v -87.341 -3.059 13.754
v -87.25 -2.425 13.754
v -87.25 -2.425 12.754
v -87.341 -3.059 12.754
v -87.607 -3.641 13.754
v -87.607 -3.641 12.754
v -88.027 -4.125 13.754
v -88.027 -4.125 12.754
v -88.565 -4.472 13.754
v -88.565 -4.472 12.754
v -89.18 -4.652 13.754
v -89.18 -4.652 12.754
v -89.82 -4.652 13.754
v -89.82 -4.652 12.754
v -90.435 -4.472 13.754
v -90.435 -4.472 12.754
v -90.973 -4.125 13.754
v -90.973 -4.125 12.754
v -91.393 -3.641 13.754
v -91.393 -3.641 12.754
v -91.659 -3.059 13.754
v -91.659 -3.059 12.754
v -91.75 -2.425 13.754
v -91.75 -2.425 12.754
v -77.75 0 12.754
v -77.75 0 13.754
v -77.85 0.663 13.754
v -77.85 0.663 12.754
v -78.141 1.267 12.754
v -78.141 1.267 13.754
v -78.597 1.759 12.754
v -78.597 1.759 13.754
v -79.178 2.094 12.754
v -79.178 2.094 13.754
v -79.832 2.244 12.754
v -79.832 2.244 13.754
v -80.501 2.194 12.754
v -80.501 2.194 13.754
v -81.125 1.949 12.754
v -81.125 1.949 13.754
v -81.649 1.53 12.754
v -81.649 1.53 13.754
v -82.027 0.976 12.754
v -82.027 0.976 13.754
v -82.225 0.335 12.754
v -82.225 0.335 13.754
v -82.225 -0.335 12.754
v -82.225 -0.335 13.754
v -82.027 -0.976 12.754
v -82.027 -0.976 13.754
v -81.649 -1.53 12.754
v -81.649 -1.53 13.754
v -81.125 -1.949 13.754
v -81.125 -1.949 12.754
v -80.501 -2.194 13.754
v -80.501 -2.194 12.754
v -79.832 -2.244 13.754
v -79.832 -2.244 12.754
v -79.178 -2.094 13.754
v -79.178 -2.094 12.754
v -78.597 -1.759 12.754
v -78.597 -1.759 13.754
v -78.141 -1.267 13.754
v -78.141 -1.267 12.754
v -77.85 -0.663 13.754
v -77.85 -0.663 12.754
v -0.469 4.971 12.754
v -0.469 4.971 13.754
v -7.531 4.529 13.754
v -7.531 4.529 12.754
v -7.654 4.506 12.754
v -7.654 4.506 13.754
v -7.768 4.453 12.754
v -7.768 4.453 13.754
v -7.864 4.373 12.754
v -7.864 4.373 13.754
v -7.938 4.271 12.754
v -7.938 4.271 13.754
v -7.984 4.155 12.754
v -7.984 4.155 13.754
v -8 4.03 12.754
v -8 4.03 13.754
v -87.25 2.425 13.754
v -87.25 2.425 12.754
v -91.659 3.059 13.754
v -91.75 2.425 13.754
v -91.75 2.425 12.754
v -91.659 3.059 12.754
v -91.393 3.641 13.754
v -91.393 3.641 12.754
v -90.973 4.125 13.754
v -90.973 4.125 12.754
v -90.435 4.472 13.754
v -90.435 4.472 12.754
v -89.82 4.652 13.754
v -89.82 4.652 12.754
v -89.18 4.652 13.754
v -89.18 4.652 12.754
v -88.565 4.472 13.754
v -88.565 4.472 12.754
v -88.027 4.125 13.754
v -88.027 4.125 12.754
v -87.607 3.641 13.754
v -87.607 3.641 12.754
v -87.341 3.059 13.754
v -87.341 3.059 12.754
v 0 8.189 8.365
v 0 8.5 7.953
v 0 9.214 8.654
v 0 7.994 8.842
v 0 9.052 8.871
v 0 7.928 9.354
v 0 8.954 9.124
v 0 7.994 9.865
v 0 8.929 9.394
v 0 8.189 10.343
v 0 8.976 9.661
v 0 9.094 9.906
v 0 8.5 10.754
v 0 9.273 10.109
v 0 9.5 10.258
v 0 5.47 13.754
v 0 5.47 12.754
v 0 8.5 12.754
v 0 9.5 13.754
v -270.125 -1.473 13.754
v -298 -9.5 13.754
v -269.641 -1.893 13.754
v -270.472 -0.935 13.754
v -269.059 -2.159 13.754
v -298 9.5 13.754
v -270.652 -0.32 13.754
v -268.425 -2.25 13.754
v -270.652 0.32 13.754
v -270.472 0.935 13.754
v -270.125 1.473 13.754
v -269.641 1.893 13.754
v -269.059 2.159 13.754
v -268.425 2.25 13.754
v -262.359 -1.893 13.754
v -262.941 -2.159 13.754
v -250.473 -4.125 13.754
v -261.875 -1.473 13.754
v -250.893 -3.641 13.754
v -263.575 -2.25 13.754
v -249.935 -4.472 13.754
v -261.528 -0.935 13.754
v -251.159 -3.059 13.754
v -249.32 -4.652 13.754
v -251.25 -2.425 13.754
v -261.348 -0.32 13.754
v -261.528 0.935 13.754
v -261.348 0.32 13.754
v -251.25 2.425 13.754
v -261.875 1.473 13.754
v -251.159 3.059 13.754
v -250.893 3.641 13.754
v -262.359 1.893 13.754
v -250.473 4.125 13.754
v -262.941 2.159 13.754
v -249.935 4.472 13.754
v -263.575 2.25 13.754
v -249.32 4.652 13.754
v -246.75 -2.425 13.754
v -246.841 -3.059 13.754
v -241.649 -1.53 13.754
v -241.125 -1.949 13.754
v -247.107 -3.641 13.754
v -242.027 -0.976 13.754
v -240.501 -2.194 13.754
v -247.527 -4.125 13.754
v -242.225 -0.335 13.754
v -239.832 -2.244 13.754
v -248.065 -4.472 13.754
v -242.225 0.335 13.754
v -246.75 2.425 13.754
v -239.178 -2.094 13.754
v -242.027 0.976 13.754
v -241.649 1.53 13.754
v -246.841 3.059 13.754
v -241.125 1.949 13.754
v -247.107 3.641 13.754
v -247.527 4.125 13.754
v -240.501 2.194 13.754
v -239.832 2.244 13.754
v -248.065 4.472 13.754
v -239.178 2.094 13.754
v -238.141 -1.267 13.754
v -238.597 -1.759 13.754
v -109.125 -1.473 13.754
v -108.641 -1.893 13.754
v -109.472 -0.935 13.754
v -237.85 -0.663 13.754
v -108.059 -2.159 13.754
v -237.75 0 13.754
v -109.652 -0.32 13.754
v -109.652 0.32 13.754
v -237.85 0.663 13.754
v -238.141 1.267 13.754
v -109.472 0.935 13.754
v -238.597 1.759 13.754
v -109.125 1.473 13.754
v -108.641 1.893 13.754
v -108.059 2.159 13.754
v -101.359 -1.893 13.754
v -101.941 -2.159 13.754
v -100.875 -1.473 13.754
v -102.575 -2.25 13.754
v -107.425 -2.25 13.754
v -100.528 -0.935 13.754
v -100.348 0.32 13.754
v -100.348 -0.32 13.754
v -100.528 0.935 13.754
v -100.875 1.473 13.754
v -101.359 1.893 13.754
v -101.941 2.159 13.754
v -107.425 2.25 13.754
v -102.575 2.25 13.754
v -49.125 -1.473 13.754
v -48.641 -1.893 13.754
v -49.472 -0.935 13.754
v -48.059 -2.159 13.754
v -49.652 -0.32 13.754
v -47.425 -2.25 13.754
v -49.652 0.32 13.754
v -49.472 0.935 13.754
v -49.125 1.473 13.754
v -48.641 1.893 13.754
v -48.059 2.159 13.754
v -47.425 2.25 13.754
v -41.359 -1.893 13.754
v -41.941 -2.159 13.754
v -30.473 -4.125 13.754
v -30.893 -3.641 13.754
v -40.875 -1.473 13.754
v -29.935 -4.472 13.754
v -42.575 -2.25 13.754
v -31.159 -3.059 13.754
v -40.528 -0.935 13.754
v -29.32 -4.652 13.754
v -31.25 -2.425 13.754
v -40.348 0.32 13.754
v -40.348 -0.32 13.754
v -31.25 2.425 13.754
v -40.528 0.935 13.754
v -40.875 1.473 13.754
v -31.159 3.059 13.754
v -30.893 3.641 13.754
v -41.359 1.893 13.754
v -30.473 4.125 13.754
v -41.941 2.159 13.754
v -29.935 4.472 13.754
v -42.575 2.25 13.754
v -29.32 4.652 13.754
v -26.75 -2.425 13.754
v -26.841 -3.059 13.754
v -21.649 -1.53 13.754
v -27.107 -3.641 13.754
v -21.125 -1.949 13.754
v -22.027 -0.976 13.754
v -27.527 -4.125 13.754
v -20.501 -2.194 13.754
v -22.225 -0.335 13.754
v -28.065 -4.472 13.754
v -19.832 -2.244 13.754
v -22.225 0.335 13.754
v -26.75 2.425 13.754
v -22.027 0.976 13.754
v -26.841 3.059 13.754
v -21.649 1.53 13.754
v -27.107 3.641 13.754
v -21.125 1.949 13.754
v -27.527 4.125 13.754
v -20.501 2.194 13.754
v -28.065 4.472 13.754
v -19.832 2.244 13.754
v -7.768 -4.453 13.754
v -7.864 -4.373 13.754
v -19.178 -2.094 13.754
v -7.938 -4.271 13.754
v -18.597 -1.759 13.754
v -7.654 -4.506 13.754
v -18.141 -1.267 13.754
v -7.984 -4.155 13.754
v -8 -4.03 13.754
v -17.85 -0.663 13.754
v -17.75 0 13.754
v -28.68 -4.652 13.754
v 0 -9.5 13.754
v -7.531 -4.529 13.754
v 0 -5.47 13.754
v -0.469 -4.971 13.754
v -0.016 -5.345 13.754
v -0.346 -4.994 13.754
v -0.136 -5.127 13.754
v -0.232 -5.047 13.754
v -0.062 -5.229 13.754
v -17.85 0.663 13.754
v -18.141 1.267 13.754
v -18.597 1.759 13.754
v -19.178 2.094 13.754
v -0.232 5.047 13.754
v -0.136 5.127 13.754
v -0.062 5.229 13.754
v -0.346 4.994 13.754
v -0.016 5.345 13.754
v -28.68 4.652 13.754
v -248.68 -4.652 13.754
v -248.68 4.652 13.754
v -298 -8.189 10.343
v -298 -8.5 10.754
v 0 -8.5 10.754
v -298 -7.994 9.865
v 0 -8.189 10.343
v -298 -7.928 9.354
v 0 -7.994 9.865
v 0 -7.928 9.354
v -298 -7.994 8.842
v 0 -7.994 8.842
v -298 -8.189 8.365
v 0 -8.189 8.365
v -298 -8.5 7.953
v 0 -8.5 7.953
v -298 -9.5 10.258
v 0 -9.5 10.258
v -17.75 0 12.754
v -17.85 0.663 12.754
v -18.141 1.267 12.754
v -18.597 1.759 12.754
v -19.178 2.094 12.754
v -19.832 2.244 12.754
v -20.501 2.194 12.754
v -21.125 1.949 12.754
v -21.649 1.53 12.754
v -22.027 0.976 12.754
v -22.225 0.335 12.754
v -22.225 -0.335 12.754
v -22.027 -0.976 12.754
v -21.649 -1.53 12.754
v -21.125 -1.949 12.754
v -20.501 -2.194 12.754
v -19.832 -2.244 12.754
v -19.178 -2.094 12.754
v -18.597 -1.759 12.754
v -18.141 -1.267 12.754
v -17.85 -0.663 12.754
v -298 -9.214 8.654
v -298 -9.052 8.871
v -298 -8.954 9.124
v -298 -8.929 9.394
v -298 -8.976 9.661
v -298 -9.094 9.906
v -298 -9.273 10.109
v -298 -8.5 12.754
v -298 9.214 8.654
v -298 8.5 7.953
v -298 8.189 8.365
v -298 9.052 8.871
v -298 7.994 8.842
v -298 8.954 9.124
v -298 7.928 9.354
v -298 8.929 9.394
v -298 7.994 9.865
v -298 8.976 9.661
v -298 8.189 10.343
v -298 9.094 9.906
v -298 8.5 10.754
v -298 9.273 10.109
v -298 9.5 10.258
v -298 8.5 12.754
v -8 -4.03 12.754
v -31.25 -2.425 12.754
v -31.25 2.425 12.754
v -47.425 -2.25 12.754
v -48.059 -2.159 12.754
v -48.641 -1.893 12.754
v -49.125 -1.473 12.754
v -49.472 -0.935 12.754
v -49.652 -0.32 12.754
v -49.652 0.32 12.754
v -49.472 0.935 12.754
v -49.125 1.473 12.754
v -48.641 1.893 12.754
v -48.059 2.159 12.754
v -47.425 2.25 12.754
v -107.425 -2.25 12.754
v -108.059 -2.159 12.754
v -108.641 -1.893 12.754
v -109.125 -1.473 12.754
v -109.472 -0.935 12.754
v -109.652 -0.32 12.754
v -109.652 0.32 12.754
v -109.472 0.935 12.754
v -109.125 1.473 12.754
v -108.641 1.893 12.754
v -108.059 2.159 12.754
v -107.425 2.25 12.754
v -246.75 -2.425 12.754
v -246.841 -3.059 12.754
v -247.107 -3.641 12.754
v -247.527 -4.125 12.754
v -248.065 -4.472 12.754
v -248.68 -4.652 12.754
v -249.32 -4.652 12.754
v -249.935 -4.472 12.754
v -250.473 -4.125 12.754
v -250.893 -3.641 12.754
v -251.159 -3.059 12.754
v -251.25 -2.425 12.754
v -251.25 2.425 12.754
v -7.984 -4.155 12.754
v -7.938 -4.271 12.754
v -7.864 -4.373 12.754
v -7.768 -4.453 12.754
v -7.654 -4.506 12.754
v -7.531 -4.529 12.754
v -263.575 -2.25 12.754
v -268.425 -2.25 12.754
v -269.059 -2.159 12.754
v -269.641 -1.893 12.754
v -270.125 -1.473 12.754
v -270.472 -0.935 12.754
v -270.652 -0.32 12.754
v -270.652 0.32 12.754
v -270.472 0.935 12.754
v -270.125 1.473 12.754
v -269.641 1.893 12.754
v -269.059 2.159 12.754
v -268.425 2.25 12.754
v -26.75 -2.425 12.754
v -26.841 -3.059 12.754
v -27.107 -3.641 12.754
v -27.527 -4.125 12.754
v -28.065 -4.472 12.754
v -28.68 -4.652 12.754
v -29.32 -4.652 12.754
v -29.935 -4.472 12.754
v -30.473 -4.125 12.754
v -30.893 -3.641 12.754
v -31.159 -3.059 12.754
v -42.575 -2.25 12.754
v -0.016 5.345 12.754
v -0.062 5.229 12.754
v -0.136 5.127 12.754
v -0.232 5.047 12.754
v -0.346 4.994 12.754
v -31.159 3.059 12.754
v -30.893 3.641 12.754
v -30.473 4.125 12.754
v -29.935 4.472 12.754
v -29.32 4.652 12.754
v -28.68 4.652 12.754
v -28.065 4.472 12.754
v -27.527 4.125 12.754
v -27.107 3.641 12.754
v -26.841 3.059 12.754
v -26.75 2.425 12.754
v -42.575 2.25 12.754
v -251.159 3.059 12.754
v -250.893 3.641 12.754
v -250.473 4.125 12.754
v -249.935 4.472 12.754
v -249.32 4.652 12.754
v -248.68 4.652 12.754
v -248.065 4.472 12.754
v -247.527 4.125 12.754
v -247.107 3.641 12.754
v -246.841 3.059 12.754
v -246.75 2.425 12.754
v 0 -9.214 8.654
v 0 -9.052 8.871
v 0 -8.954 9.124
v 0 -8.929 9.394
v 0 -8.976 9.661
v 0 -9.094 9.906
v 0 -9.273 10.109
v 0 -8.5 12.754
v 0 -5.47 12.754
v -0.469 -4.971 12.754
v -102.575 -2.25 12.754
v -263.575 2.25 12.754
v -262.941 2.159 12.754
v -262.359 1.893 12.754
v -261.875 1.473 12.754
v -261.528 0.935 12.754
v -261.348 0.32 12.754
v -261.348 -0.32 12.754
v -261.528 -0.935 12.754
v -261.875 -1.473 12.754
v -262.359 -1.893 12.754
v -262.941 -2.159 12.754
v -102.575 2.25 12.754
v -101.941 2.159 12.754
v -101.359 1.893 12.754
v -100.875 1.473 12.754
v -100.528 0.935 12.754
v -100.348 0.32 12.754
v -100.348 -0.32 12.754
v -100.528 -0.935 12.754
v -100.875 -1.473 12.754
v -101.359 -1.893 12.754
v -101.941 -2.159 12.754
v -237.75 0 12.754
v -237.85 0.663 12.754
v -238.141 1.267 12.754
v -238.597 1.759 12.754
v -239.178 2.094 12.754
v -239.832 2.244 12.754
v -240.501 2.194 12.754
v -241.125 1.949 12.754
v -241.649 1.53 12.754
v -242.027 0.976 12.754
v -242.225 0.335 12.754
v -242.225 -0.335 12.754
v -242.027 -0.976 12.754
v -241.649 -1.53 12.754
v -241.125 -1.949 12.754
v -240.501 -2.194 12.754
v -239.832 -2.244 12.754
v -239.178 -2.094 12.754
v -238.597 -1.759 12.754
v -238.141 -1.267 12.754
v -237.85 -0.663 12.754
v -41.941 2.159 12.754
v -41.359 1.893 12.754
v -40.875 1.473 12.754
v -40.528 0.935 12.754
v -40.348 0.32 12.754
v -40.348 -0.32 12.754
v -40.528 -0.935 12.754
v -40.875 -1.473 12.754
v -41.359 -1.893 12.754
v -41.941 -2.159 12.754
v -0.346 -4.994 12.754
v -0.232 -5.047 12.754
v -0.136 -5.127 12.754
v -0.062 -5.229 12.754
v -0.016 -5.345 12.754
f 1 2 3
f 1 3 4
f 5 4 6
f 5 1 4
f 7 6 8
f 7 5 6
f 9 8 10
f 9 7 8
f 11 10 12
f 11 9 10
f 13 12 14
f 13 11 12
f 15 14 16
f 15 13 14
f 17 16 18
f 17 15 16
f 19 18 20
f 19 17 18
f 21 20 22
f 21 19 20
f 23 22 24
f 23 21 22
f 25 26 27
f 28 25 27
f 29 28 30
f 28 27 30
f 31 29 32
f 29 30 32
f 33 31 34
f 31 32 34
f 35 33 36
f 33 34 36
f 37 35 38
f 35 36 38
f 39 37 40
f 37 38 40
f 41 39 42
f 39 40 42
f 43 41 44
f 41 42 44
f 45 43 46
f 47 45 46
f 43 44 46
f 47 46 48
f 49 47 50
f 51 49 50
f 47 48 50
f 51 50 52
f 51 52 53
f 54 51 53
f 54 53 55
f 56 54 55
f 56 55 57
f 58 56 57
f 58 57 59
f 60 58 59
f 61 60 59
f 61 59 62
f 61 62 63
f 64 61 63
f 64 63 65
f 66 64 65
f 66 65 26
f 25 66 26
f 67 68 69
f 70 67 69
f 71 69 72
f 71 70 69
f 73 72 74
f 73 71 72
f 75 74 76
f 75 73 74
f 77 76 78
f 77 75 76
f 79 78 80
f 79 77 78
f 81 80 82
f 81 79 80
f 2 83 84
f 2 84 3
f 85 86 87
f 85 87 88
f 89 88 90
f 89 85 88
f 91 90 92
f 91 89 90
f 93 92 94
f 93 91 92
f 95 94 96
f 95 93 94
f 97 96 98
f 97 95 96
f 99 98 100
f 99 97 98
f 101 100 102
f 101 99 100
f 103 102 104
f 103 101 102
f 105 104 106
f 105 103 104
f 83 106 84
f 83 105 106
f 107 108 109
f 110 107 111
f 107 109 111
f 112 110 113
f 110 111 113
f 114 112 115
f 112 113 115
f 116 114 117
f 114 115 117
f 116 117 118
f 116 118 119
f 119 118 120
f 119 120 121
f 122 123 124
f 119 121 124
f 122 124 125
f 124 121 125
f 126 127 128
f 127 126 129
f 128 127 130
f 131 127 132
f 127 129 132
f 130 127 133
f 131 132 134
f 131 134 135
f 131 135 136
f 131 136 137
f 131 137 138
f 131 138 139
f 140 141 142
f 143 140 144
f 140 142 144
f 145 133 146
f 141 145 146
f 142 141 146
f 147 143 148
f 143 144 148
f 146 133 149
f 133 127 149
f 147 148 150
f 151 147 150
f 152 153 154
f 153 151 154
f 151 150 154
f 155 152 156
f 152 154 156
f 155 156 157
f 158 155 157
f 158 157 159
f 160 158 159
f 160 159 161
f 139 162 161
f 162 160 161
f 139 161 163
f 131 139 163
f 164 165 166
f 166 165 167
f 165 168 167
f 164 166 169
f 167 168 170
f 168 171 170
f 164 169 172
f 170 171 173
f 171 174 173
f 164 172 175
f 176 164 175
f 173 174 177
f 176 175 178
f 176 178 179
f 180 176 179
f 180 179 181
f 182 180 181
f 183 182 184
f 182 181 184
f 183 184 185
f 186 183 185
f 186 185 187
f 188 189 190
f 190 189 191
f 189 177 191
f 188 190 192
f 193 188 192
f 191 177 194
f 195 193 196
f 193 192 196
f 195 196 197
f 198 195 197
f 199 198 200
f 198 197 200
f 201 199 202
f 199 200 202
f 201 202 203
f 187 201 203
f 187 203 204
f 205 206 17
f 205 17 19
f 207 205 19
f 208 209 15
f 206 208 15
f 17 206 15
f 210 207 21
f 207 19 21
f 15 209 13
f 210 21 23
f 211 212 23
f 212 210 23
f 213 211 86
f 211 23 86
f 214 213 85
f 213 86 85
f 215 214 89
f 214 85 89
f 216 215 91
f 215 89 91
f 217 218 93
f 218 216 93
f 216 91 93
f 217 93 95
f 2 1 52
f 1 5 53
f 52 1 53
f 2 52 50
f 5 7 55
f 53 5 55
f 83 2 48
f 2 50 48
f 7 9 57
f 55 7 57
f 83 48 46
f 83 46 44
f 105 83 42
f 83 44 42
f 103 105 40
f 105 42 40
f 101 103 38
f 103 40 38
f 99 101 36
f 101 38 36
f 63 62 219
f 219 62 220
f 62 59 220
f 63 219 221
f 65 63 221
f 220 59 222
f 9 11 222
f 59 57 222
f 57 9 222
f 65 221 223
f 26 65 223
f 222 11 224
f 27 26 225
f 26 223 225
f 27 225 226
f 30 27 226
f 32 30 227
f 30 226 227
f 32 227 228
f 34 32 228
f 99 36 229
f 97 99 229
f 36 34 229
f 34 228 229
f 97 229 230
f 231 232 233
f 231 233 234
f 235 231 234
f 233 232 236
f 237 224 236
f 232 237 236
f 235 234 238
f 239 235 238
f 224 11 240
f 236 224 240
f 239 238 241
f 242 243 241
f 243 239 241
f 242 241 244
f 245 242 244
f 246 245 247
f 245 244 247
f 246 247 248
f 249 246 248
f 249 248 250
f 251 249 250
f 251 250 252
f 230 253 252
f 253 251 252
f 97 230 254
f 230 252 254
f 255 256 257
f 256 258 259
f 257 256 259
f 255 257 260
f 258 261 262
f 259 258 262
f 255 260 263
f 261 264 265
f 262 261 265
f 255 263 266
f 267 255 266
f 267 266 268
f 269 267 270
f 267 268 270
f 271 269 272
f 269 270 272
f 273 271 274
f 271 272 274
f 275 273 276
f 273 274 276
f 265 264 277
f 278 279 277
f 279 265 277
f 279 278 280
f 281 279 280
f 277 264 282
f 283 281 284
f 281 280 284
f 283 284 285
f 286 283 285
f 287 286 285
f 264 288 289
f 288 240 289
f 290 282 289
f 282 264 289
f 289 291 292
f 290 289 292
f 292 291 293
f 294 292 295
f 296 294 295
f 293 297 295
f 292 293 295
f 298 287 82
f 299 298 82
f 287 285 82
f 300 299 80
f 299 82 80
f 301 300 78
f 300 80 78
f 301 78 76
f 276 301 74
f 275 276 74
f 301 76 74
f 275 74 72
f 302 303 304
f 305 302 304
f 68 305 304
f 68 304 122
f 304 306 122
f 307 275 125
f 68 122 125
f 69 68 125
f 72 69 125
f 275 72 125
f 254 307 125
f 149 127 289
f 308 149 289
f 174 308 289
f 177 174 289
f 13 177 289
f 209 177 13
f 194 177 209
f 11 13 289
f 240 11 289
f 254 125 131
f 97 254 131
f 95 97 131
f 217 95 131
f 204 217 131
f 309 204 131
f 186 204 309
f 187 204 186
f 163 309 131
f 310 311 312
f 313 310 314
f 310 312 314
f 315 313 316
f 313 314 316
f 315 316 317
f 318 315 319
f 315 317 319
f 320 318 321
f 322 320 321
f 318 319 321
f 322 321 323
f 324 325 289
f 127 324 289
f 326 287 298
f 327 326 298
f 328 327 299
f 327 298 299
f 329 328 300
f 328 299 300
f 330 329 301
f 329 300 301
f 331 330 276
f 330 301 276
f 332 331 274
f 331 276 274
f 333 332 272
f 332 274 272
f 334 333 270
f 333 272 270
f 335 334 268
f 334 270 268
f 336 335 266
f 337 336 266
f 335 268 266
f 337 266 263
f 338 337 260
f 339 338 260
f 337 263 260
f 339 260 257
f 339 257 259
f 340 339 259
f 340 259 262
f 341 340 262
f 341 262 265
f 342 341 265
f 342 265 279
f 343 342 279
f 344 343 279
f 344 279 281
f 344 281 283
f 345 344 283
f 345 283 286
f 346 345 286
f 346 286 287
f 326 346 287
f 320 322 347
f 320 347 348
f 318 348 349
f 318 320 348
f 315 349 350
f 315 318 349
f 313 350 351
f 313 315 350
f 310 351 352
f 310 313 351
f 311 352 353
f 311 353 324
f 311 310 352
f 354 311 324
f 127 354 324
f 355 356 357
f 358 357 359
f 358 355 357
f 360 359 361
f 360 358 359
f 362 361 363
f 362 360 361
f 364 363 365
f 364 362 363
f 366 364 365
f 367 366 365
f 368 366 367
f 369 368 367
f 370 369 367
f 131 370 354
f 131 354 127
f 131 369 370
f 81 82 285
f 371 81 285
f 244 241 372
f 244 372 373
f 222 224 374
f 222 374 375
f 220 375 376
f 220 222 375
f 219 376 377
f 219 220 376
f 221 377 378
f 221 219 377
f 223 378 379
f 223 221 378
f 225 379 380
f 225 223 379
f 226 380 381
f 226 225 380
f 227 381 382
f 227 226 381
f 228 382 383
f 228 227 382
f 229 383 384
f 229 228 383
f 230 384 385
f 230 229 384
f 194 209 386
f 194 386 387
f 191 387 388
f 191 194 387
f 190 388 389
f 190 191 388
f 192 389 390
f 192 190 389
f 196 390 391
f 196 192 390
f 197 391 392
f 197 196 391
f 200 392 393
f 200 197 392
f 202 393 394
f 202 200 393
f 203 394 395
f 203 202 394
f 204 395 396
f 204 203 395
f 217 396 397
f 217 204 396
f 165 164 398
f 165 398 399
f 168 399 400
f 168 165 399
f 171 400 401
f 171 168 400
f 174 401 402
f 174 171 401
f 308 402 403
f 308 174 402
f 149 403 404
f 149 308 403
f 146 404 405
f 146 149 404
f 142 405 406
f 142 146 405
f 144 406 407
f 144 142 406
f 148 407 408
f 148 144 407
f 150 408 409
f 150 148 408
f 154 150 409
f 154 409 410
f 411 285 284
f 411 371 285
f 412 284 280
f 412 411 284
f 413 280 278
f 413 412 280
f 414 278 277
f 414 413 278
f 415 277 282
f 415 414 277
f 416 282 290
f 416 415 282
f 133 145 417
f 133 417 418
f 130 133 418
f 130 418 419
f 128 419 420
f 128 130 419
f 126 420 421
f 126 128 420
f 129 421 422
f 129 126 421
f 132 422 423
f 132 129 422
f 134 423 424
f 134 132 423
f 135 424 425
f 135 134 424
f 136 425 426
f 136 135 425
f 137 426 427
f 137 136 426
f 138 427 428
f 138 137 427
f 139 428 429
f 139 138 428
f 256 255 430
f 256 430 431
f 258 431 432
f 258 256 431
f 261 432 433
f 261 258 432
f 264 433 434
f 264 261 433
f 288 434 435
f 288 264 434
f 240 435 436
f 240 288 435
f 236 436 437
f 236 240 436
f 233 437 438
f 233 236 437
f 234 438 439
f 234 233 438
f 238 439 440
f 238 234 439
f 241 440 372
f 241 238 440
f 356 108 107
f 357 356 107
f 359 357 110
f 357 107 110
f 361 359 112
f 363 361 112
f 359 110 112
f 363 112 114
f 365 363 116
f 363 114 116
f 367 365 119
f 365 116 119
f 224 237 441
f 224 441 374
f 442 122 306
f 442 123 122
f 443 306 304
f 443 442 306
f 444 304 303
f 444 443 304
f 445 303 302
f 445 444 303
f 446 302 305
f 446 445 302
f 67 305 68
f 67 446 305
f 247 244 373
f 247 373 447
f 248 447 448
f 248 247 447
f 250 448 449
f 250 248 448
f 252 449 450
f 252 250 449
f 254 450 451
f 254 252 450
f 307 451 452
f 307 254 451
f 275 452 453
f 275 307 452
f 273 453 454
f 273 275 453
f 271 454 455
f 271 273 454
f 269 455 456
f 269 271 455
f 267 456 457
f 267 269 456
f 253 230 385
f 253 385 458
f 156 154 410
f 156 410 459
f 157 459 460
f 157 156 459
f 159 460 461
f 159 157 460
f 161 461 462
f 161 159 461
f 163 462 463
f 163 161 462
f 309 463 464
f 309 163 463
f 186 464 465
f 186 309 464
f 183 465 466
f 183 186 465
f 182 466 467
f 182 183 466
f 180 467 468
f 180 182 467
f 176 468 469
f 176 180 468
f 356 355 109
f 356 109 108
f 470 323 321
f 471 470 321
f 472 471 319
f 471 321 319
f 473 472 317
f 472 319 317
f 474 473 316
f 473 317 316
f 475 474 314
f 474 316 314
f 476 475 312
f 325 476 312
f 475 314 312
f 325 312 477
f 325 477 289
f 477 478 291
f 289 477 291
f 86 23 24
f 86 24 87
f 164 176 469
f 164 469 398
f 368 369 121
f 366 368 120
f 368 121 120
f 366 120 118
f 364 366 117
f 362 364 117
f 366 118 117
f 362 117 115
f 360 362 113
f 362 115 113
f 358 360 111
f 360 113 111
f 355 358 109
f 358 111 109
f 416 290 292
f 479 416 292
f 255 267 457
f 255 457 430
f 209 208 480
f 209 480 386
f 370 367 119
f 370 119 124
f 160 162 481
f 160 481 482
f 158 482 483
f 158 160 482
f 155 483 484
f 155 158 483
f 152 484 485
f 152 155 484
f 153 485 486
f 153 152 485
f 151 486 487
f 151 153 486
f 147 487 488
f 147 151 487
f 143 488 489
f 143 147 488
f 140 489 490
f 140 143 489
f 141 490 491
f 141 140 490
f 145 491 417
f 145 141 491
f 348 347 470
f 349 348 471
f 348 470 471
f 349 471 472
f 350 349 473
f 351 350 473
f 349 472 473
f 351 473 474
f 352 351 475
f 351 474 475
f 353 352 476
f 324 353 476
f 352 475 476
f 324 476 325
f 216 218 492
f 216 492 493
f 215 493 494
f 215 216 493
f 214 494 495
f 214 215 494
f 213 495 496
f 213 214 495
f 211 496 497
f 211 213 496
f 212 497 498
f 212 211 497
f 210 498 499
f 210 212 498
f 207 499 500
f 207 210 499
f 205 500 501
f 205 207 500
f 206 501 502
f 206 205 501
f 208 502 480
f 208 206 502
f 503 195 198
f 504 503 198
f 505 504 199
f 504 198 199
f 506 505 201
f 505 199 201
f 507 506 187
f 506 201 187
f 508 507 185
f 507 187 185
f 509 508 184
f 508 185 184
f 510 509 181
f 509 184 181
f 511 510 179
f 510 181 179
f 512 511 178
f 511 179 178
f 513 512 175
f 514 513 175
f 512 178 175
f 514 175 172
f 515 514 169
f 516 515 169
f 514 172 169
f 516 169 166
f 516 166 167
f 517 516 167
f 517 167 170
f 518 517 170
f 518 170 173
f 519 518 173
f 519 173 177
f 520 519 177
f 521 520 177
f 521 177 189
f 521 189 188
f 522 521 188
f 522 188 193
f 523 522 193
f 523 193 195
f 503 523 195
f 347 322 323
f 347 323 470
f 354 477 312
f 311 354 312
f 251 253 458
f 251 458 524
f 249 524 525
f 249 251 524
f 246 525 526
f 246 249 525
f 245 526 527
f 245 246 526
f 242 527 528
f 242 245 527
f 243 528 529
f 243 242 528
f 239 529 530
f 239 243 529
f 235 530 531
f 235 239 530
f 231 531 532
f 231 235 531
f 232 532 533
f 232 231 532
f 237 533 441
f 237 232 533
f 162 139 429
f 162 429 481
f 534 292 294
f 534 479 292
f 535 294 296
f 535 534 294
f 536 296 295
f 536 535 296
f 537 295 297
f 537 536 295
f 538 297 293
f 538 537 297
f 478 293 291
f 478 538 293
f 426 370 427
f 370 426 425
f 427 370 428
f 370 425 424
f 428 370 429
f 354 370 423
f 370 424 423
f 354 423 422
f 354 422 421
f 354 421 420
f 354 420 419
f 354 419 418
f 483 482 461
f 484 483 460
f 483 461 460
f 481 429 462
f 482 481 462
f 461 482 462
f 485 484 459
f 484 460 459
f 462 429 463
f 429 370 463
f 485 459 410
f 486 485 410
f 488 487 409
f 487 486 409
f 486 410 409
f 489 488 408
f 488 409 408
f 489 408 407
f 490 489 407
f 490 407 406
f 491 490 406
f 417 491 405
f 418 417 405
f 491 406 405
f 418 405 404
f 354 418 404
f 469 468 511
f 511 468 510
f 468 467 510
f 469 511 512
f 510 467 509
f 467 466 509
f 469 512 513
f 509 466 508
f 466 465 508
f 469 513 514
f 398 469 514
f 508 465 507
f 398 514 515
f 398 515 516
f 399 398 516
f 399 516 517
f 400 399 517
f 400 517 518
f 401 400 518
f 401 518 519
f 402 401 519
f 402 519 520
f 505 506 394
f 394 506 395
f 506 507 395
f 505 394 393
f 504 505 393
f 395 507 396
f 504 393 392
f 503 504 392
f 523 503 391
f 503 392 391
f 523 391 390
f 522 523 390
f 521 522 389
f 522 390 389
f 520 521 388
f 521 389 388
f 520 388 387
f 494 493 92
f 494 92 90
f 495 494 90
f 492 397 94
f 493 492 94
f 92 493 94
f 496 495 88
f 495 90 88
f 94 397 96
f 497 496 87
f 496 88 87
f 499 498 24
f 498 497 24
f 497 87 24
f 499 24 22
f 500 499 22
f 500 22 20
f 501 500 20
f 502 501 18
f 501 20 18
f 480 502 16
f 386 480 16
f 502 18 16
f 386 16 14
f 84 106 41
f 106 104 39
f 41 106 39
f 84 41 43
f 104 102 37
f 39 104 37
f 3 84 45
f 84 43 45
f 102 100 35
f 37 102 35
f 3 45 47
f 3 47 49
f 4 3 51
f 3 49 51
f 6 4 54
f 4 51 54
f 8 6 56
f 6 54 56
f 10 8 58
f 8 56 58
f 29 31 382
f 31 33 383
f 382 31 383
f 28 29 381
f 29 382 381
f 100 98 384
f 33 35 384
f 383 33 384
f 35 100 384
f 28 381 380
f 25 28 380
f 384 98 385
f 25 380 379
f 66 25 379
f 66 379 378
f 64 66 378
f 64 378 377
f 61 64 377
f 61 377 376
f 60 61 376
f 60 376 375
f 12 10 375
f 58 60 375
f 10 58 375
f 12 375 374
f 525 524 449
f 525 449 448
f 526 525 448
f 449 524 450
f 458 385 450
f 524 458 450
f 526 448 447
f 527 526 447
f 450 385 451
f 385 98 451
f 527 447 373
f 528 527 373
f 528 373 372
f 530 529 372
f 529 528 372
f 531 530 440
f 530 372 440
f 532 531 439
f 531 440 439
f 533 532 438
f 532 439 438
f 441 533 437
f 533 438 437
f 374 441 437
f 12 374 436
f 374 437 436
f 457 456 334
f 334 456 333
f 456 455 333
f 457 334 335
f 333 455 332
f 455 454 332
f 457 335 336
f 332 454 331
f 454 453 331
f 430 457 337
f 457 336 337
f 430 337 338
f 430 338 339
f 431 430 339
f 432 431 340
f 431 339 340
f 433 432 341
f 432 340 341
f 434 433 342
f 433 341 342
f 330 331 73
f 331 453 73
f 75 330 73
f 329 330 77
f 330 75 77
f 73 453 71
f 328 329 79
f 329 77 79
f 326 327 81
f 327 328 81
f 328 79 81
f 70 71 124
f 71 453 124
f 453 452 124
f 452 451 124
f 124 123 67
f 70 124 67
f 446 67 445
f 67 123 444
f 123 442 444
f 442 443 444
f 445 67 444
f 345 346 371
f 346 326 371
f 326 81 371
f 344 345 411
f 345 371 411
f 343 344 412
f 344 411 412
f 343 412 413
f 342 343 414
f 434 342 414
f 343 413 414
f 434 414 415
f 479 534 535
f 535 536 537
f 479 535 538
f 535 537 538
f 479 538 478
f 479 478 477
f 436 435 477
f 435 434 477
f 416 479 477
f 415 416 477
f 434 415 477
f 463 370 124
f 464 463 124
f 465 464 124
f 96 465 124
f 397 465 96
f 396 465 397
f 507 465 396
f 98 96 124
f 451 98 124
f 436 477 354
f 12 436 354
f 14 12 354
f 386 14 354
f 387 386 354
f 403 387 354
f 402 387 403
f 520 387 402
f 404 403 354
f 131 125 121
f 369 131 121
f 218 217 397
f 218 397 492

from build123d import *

# Parameters (mm, degrees)
EXTRUDE_THIN1_DEPTH   = 298
ESBO_O1_R             = 2.25
CORTE_EXTRUS_O1_DEPTH = 299.207817733
FILETE1_R             = 0.5


with BuildPart() as part:
    # Sketch1 → Extrude-Thin1 (new body)
    with BuildSketch(Plane(origin=(0, 0, 0), x_dir=(0, 0, -1), z_dir=(1, 0, 0))):
        with BuildLine():
            ThreePointArc((-7.953264718, 8.5), (-9.353805922, 7.927754998), (-10.754347127, 8.5))
            Line((-10.754347127, 8.5), (-12.754347127, 8.5))
            Line((-12.754347127, 8.5), (-12.754347127, -8.5))
            Line((-12.754347127, -8.5), (-10.754347127, -8.5))
            ThreePointArc((-10.754347127, -8.5), (-9.353805922, -7.927754998), (-7.953264718, -8.5))
            Line((-7.953264718, -8.5), (-8.65353532, -9.213877499))
            ThreePointArc((-8.65353532, -9.213877499), (-9.529396971, -8.943291803), (-10.25770064, -9.5))
            Line((-10.25770064, -9.5), (-13.754347127, -9.5))
            Line((-13.754347127, -9.5), (-13.754347127, 9.5))
            Line((-13.754347127, 9.5), (-10.25770064, 9.5))
            ThreePointArc((-10.25770064, 9.5), (-9.529396971, 8.943291803), (-8.65353532, 9.213877499))
            Line((-8.65353532, 9.213877499), (-7.953264718, 8.5))
        make_face()
    extrude(amount=-EXTRUDE_THIN1_DEPTH)

    # Esboço1 → Corte-extrusão1 (cut, through all)
    with BuildSketch(Plane.XY.offset(13.754347127)):
        with Locations((-240, 0)):
            Circle(ESBO_O1_R)
        with Locations((-20, 0)):
            Circle(ESBO_O1_R)
        with Locations((-80, 0)):
            Circle(ESBO_O1_R)
        with BuildLine():
            Line((-268.425, 2.25), (-263.575, 2.25))
            ThreePointArc((-263.575, 2.25), (-261.325, 0), (-263.575, -2.25))
            Line((-263.575, -2.25), (-268.425, -2.25))
            ThreePointArc((-268.425, -2.25), (-270.675, 0), (-268.425, 2.25))
        make_face()
        with BuildLine():
            Line((-246.75, 2.425), (-246.75, -2.425))
            ThreePointArc((-246.75, -2.425), (-249, -4.675), (-251.25, -2.425))
            Line((-251.25, -2.425), (-251.25, 2.425))
            ThreePointArc((-251.25, 2.425), (-249, 4.675), (-246.75, 2.425))
        make_face()
        Polygon((-8, 4.5), (-8, -4.5), (0, -5), (0, 5), align=None)
        with BuildLine():
            Line((-47.425, 2.25), (-42.575, 2.25))
            ThreePointArc((-42.575, 2.25), (-40.325, 0), (-42.575, -2.25))
            Line((-42.575, -2.25), (-47.425, -2.25))
            ThreePointArc((-47.425, -2.25), (-49.675, 0), (-47.425, 2.25))
        make_face()
        with BuildLine():
            Line((-26.75, 2.425), (-26.75, -2.425))
            ThreePointArc((-26.75, -2.425), (-29, -4.675), (-31.25, -2.425))
            Line((-31.25, -2.425), (-31.25, 2.425))
            ThreePointArc((-31.25, 2.425), (-29, 4.675), (-26.75, 2.425))
        make_face()
        with BuildLine():
            Line((-107.425, 2.25), (-102.575, 2.25))
            ThreePointArc((-102.575, 2.25), (-100.325, 0), (-102.575, -2.25))
            Line((-102.575, -2.25), (-107.425, -2.25))
            ThreePointArc((-107.425, -2.25), (-109.675, 0), (-107.425, 2.25))
        make_face()
        with BuildLine():
            Line((-87.25, 2.425), (-87.25, -2.425))
            ThreePointArc((-87.25, -2.425), (-89.5, -4.675), (-91.75, -2.425))
            Line((-91.75, -2.425), (-91.75, 2.425))
            ThreePointArc((-91.75, 2.425), (-89.5, 4.675), (-87.25, 2.425))
        make_face()
    extrude(amount=-CORTE_EXTRUS_O1_DEPTH, mode=Mode.SUBTRACT)

    # Filete1
    filete1_edges = [part.edges().sort_by_distance(p)[0] for p in [
        (-8, -4.5, 13.254347127),
        (-8, 4.5, 13.254347127),
        (0, 5, 13.254347127),
        (0, -5, 13.254347127),
    ]]
    fillet(filete1_edges, radius=FILETE1_R)


solid = part.part
